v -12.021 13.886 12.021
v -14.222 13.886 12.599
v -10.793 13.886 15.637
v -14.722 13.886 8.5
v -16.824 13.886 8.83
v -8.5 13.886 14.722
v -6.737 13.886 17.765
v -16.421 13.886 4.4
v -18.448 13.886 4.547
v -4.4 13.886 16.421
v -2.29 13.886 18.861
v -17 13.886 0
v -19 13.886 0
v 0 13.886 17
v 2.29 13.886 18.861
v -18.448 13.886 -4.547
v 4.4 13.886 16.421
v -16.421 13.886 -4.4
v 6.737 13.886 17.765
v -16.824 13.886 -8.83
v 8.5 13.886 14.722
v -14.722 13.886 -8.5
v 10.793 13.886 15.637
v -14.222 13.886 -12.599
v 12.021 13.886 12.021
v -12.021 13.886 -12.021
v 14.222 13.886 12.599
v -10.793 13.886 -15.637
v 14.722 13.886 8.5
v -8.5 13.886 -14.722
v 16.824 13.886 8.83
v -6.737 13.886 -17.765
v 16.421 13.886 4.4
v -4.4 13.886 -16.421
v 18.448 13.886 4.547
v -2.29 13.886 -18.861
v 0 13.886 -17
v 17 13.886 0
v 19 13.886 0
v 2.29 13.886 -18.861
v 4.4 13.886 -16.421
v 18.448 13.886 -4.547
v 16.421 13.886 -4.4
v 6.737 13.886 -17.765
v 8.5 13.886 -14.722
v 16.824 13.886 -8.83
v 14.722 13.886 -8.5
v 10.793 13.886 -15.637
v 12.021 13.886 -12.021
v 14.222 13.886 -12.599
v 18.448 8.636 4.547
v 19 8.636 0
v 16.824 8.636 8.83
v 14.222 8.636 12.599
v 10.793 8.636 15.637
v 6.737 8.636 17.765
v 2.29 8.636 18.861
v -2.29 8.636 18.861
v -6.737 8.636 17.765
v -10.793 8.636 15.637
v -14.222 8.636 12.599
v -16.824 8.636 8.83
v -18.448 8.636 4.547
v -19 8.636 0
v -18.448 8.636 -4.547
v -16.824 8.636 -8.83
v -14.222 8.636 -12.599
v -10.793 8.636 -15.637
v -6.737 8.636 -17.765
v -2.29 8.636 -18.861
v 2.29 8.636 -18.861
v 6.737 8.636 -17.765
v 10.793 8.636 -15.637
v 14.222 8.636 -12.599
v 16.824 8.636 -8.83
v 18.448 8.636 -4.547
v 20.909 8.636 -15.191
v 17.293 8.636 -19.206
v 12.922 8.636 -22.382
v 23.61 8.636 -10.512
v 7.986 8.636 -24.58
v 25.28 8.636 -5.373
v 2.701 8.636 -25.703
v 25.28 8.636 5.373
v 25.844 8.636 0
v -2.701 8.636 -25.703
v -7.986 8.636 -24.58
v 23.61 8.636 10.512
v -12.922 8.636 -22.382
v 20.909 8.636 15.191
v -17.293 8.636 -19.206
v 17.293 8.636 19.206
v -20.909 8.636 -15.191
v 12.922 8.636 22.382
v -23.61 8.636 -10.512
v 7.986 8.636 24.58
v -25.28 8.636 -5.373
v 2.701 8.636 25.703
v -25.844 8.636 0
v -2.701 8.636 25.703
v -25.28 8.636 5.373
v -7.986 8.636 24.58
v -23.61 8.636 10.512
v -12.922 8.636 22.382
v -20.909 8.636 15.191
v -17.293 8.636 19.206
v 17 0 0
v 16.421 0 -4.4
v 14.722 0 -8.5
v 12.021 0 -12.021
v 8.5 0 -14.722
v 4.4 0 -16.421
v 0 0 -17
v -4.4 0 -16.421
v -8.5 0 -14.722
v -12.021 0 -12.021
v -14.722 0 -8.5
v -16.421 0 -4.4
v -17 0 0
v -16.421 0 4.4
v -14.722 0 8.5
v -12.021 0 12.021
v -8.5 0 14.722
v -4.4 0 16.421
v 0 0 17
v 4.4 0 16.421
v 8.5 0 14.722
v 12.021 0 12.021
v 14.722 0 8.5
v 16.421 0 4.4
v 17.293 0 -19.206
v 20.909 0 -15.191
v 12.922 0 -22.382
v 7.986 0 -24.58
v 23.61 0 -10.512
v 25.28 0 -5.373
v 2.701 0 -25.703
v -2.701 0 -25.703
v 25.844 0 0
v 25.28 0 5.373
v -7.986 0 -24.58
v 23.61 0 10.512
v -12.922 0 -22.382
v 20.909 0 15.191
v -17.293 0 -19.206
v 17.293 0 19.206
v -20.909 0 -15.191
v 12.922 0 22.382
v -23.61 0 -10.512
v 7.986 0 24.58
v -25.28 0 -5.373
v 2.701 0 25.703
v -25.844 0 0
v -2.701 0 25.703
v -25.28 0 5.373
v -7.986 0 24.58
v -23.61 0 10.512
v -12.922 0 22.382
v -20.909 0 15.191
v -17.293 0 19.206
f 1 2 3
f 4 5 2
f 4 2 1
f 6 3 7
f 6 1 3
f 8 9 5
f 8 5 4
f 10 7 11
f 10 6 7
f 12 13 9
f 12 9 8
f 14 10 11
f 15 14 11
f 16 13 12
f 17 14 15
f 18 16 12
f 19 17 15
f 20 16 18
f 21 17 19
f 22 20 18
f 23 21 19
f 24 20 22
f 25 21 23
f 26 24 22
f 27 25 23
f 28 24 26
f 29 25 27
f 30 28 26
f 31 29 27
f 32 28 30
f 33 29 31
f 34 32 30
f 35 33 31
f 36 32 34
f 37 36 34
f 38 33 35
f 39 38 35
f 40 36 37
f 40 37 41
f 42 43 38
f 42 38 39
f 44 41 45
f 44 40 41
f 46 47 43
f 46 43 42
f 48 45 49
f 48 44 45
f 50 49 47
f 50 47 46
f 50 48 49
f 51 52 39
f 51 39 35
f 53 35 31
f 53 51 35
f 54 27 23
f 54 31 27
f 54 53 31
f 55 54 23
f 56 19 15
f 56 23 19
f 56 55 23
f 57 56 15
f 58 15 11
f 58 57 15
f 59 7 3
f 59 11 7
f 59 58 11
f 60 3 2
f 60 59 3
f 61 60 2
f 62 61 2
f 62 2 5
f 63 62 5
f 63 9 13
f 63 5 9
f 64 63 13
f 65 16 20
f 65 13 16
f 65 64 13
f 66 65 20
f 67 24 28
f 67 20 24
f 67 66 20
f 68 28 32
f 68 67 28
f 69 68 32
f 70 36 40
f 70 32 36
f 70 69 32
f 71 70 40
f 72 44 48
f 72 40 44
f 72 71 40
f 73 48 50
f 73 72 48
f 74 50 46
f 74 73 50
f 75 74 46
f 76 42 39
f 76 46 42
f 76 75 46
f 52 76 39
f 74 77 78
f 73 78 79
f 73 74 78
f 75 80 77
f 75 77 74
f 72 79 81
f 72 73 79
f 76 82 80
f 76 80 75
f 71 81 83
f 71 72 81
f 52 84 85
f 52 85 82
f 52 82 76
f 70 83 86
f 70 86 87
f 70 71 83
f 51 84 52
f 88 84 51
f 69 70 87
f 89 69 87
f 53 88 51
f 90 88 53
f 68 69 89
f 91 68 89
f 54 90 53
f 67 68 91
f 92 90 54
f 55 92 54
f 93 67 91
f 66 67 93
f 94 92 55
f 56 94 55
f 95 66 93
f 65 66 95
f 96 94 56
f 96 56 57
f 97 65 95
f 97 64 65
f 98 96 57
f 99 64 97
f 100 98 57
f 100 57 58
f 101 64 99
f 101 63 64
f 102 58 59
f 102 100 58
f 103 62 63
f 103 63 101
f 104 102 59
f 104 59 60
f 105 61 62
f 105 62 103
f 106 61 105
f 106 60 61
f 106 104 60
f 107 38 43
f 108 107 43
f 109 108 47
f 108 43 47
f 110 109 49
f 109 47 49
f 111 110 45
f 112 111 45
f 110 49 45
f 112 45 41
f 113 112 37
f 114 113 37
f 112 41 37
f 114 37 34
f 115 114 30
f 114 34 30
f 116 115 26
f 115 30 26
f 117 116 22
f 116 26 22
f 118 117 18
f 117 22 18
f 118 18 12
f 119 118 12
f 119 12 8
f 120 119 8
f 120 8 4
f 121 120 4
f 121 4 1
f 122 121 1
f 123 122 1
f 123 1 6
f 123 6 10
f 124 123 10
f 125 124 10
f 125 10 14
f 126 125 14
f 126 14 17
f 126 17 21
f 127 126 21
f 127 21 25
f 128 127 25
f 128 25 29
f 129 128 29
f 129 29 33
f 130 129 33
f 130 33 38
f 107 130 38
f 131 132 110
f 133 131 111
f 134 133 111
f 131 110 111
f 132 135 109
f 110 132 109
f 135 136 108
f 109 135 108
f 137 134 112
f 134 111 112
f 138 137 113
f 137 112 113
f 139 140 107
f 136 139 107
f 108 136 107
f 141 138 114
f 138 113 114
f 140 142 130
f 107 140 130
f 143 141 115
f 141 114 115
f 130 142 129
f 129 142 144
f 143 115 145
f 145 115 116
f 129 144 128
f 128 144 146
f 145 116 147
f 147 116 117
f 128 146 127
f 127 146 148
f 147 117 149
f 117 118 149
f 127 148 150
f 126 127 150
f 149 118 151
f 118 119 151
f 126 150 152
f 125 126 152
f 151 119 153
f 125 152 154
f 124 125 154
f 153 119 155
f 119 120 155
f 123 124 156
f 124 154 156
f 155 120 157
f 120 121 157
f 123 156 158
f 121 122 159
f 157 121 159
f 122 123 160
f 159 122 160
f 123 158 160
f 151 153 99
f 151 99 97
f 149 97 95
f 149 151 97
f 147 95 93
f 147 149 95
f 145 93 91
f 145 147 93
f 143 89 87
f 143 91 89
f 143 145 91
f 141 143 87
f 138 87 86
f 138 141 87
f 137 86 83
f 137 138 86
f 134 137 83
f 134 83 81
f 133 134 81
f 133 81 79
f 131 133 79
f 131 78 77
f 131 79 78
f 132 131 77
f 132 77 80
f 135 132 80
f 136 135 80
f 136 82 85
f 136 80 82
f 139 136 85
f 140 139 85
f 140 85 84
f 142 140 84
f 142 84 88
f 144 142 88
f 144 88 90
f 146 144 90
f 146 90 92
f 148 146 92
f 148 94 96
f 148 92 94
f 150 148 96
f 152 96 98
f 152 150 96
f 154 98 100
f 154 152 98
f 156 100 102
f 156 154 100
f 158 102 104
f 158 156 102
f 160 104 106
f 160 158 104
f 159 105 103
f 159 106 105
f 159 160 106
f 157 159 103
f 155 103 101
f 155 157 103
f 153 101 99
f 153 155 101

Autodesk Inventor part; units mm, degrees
ref_plane "YZ Plane" through (0, 0, 0) normal (1, 0, 0) x (0, 1, 0)
ref_plane "XZ Plane" through (0, 0, 0) normal (0, 1, 0) x (-1, 0, 0)
ref_plane "XY Plane" through (0, 0, 0) normal (0, 0, 1) x (1, 0, 0)
sketch "Sketch1" plane through (0, 0, 0) normal (0, 1, 0) x (-1, 0, 0)
  circle A0 centre (0, 0) radius 25.8445
  dimension "d0" = 51.689
extrude "Extrusion1" add sketch "Sketch1" along normal blind 8.636
sketch "Sketch2" plane through (0, 8.636, 0) normal (0, 1, 0) x (1, 0, 0)
  circle A0 centre (0, 0) radius 19
  dimension "d3" = 37.9999
extrude "Extrusion2" add sketch "Sketch2" along normal blind 5.25
sketch "Sketch3" plane through (0, 13.886, 0) normal (0, 1, 0) x (1, 0, 0)
  circle A0 centre (0, 0) radius 17
  dimension "d6" = 33.9999
extrude "Extrusion3" cut sketch "Sketch3" against normal through all
thread "Thread2" size "2.035-40 UNS" designation "SM2 (2.035-40 UNS)" class "2A" standard "ANSI Unified Screw Threads" full length
properties part number "38mm to SM2" material "Aluminum 6061-AHC"
